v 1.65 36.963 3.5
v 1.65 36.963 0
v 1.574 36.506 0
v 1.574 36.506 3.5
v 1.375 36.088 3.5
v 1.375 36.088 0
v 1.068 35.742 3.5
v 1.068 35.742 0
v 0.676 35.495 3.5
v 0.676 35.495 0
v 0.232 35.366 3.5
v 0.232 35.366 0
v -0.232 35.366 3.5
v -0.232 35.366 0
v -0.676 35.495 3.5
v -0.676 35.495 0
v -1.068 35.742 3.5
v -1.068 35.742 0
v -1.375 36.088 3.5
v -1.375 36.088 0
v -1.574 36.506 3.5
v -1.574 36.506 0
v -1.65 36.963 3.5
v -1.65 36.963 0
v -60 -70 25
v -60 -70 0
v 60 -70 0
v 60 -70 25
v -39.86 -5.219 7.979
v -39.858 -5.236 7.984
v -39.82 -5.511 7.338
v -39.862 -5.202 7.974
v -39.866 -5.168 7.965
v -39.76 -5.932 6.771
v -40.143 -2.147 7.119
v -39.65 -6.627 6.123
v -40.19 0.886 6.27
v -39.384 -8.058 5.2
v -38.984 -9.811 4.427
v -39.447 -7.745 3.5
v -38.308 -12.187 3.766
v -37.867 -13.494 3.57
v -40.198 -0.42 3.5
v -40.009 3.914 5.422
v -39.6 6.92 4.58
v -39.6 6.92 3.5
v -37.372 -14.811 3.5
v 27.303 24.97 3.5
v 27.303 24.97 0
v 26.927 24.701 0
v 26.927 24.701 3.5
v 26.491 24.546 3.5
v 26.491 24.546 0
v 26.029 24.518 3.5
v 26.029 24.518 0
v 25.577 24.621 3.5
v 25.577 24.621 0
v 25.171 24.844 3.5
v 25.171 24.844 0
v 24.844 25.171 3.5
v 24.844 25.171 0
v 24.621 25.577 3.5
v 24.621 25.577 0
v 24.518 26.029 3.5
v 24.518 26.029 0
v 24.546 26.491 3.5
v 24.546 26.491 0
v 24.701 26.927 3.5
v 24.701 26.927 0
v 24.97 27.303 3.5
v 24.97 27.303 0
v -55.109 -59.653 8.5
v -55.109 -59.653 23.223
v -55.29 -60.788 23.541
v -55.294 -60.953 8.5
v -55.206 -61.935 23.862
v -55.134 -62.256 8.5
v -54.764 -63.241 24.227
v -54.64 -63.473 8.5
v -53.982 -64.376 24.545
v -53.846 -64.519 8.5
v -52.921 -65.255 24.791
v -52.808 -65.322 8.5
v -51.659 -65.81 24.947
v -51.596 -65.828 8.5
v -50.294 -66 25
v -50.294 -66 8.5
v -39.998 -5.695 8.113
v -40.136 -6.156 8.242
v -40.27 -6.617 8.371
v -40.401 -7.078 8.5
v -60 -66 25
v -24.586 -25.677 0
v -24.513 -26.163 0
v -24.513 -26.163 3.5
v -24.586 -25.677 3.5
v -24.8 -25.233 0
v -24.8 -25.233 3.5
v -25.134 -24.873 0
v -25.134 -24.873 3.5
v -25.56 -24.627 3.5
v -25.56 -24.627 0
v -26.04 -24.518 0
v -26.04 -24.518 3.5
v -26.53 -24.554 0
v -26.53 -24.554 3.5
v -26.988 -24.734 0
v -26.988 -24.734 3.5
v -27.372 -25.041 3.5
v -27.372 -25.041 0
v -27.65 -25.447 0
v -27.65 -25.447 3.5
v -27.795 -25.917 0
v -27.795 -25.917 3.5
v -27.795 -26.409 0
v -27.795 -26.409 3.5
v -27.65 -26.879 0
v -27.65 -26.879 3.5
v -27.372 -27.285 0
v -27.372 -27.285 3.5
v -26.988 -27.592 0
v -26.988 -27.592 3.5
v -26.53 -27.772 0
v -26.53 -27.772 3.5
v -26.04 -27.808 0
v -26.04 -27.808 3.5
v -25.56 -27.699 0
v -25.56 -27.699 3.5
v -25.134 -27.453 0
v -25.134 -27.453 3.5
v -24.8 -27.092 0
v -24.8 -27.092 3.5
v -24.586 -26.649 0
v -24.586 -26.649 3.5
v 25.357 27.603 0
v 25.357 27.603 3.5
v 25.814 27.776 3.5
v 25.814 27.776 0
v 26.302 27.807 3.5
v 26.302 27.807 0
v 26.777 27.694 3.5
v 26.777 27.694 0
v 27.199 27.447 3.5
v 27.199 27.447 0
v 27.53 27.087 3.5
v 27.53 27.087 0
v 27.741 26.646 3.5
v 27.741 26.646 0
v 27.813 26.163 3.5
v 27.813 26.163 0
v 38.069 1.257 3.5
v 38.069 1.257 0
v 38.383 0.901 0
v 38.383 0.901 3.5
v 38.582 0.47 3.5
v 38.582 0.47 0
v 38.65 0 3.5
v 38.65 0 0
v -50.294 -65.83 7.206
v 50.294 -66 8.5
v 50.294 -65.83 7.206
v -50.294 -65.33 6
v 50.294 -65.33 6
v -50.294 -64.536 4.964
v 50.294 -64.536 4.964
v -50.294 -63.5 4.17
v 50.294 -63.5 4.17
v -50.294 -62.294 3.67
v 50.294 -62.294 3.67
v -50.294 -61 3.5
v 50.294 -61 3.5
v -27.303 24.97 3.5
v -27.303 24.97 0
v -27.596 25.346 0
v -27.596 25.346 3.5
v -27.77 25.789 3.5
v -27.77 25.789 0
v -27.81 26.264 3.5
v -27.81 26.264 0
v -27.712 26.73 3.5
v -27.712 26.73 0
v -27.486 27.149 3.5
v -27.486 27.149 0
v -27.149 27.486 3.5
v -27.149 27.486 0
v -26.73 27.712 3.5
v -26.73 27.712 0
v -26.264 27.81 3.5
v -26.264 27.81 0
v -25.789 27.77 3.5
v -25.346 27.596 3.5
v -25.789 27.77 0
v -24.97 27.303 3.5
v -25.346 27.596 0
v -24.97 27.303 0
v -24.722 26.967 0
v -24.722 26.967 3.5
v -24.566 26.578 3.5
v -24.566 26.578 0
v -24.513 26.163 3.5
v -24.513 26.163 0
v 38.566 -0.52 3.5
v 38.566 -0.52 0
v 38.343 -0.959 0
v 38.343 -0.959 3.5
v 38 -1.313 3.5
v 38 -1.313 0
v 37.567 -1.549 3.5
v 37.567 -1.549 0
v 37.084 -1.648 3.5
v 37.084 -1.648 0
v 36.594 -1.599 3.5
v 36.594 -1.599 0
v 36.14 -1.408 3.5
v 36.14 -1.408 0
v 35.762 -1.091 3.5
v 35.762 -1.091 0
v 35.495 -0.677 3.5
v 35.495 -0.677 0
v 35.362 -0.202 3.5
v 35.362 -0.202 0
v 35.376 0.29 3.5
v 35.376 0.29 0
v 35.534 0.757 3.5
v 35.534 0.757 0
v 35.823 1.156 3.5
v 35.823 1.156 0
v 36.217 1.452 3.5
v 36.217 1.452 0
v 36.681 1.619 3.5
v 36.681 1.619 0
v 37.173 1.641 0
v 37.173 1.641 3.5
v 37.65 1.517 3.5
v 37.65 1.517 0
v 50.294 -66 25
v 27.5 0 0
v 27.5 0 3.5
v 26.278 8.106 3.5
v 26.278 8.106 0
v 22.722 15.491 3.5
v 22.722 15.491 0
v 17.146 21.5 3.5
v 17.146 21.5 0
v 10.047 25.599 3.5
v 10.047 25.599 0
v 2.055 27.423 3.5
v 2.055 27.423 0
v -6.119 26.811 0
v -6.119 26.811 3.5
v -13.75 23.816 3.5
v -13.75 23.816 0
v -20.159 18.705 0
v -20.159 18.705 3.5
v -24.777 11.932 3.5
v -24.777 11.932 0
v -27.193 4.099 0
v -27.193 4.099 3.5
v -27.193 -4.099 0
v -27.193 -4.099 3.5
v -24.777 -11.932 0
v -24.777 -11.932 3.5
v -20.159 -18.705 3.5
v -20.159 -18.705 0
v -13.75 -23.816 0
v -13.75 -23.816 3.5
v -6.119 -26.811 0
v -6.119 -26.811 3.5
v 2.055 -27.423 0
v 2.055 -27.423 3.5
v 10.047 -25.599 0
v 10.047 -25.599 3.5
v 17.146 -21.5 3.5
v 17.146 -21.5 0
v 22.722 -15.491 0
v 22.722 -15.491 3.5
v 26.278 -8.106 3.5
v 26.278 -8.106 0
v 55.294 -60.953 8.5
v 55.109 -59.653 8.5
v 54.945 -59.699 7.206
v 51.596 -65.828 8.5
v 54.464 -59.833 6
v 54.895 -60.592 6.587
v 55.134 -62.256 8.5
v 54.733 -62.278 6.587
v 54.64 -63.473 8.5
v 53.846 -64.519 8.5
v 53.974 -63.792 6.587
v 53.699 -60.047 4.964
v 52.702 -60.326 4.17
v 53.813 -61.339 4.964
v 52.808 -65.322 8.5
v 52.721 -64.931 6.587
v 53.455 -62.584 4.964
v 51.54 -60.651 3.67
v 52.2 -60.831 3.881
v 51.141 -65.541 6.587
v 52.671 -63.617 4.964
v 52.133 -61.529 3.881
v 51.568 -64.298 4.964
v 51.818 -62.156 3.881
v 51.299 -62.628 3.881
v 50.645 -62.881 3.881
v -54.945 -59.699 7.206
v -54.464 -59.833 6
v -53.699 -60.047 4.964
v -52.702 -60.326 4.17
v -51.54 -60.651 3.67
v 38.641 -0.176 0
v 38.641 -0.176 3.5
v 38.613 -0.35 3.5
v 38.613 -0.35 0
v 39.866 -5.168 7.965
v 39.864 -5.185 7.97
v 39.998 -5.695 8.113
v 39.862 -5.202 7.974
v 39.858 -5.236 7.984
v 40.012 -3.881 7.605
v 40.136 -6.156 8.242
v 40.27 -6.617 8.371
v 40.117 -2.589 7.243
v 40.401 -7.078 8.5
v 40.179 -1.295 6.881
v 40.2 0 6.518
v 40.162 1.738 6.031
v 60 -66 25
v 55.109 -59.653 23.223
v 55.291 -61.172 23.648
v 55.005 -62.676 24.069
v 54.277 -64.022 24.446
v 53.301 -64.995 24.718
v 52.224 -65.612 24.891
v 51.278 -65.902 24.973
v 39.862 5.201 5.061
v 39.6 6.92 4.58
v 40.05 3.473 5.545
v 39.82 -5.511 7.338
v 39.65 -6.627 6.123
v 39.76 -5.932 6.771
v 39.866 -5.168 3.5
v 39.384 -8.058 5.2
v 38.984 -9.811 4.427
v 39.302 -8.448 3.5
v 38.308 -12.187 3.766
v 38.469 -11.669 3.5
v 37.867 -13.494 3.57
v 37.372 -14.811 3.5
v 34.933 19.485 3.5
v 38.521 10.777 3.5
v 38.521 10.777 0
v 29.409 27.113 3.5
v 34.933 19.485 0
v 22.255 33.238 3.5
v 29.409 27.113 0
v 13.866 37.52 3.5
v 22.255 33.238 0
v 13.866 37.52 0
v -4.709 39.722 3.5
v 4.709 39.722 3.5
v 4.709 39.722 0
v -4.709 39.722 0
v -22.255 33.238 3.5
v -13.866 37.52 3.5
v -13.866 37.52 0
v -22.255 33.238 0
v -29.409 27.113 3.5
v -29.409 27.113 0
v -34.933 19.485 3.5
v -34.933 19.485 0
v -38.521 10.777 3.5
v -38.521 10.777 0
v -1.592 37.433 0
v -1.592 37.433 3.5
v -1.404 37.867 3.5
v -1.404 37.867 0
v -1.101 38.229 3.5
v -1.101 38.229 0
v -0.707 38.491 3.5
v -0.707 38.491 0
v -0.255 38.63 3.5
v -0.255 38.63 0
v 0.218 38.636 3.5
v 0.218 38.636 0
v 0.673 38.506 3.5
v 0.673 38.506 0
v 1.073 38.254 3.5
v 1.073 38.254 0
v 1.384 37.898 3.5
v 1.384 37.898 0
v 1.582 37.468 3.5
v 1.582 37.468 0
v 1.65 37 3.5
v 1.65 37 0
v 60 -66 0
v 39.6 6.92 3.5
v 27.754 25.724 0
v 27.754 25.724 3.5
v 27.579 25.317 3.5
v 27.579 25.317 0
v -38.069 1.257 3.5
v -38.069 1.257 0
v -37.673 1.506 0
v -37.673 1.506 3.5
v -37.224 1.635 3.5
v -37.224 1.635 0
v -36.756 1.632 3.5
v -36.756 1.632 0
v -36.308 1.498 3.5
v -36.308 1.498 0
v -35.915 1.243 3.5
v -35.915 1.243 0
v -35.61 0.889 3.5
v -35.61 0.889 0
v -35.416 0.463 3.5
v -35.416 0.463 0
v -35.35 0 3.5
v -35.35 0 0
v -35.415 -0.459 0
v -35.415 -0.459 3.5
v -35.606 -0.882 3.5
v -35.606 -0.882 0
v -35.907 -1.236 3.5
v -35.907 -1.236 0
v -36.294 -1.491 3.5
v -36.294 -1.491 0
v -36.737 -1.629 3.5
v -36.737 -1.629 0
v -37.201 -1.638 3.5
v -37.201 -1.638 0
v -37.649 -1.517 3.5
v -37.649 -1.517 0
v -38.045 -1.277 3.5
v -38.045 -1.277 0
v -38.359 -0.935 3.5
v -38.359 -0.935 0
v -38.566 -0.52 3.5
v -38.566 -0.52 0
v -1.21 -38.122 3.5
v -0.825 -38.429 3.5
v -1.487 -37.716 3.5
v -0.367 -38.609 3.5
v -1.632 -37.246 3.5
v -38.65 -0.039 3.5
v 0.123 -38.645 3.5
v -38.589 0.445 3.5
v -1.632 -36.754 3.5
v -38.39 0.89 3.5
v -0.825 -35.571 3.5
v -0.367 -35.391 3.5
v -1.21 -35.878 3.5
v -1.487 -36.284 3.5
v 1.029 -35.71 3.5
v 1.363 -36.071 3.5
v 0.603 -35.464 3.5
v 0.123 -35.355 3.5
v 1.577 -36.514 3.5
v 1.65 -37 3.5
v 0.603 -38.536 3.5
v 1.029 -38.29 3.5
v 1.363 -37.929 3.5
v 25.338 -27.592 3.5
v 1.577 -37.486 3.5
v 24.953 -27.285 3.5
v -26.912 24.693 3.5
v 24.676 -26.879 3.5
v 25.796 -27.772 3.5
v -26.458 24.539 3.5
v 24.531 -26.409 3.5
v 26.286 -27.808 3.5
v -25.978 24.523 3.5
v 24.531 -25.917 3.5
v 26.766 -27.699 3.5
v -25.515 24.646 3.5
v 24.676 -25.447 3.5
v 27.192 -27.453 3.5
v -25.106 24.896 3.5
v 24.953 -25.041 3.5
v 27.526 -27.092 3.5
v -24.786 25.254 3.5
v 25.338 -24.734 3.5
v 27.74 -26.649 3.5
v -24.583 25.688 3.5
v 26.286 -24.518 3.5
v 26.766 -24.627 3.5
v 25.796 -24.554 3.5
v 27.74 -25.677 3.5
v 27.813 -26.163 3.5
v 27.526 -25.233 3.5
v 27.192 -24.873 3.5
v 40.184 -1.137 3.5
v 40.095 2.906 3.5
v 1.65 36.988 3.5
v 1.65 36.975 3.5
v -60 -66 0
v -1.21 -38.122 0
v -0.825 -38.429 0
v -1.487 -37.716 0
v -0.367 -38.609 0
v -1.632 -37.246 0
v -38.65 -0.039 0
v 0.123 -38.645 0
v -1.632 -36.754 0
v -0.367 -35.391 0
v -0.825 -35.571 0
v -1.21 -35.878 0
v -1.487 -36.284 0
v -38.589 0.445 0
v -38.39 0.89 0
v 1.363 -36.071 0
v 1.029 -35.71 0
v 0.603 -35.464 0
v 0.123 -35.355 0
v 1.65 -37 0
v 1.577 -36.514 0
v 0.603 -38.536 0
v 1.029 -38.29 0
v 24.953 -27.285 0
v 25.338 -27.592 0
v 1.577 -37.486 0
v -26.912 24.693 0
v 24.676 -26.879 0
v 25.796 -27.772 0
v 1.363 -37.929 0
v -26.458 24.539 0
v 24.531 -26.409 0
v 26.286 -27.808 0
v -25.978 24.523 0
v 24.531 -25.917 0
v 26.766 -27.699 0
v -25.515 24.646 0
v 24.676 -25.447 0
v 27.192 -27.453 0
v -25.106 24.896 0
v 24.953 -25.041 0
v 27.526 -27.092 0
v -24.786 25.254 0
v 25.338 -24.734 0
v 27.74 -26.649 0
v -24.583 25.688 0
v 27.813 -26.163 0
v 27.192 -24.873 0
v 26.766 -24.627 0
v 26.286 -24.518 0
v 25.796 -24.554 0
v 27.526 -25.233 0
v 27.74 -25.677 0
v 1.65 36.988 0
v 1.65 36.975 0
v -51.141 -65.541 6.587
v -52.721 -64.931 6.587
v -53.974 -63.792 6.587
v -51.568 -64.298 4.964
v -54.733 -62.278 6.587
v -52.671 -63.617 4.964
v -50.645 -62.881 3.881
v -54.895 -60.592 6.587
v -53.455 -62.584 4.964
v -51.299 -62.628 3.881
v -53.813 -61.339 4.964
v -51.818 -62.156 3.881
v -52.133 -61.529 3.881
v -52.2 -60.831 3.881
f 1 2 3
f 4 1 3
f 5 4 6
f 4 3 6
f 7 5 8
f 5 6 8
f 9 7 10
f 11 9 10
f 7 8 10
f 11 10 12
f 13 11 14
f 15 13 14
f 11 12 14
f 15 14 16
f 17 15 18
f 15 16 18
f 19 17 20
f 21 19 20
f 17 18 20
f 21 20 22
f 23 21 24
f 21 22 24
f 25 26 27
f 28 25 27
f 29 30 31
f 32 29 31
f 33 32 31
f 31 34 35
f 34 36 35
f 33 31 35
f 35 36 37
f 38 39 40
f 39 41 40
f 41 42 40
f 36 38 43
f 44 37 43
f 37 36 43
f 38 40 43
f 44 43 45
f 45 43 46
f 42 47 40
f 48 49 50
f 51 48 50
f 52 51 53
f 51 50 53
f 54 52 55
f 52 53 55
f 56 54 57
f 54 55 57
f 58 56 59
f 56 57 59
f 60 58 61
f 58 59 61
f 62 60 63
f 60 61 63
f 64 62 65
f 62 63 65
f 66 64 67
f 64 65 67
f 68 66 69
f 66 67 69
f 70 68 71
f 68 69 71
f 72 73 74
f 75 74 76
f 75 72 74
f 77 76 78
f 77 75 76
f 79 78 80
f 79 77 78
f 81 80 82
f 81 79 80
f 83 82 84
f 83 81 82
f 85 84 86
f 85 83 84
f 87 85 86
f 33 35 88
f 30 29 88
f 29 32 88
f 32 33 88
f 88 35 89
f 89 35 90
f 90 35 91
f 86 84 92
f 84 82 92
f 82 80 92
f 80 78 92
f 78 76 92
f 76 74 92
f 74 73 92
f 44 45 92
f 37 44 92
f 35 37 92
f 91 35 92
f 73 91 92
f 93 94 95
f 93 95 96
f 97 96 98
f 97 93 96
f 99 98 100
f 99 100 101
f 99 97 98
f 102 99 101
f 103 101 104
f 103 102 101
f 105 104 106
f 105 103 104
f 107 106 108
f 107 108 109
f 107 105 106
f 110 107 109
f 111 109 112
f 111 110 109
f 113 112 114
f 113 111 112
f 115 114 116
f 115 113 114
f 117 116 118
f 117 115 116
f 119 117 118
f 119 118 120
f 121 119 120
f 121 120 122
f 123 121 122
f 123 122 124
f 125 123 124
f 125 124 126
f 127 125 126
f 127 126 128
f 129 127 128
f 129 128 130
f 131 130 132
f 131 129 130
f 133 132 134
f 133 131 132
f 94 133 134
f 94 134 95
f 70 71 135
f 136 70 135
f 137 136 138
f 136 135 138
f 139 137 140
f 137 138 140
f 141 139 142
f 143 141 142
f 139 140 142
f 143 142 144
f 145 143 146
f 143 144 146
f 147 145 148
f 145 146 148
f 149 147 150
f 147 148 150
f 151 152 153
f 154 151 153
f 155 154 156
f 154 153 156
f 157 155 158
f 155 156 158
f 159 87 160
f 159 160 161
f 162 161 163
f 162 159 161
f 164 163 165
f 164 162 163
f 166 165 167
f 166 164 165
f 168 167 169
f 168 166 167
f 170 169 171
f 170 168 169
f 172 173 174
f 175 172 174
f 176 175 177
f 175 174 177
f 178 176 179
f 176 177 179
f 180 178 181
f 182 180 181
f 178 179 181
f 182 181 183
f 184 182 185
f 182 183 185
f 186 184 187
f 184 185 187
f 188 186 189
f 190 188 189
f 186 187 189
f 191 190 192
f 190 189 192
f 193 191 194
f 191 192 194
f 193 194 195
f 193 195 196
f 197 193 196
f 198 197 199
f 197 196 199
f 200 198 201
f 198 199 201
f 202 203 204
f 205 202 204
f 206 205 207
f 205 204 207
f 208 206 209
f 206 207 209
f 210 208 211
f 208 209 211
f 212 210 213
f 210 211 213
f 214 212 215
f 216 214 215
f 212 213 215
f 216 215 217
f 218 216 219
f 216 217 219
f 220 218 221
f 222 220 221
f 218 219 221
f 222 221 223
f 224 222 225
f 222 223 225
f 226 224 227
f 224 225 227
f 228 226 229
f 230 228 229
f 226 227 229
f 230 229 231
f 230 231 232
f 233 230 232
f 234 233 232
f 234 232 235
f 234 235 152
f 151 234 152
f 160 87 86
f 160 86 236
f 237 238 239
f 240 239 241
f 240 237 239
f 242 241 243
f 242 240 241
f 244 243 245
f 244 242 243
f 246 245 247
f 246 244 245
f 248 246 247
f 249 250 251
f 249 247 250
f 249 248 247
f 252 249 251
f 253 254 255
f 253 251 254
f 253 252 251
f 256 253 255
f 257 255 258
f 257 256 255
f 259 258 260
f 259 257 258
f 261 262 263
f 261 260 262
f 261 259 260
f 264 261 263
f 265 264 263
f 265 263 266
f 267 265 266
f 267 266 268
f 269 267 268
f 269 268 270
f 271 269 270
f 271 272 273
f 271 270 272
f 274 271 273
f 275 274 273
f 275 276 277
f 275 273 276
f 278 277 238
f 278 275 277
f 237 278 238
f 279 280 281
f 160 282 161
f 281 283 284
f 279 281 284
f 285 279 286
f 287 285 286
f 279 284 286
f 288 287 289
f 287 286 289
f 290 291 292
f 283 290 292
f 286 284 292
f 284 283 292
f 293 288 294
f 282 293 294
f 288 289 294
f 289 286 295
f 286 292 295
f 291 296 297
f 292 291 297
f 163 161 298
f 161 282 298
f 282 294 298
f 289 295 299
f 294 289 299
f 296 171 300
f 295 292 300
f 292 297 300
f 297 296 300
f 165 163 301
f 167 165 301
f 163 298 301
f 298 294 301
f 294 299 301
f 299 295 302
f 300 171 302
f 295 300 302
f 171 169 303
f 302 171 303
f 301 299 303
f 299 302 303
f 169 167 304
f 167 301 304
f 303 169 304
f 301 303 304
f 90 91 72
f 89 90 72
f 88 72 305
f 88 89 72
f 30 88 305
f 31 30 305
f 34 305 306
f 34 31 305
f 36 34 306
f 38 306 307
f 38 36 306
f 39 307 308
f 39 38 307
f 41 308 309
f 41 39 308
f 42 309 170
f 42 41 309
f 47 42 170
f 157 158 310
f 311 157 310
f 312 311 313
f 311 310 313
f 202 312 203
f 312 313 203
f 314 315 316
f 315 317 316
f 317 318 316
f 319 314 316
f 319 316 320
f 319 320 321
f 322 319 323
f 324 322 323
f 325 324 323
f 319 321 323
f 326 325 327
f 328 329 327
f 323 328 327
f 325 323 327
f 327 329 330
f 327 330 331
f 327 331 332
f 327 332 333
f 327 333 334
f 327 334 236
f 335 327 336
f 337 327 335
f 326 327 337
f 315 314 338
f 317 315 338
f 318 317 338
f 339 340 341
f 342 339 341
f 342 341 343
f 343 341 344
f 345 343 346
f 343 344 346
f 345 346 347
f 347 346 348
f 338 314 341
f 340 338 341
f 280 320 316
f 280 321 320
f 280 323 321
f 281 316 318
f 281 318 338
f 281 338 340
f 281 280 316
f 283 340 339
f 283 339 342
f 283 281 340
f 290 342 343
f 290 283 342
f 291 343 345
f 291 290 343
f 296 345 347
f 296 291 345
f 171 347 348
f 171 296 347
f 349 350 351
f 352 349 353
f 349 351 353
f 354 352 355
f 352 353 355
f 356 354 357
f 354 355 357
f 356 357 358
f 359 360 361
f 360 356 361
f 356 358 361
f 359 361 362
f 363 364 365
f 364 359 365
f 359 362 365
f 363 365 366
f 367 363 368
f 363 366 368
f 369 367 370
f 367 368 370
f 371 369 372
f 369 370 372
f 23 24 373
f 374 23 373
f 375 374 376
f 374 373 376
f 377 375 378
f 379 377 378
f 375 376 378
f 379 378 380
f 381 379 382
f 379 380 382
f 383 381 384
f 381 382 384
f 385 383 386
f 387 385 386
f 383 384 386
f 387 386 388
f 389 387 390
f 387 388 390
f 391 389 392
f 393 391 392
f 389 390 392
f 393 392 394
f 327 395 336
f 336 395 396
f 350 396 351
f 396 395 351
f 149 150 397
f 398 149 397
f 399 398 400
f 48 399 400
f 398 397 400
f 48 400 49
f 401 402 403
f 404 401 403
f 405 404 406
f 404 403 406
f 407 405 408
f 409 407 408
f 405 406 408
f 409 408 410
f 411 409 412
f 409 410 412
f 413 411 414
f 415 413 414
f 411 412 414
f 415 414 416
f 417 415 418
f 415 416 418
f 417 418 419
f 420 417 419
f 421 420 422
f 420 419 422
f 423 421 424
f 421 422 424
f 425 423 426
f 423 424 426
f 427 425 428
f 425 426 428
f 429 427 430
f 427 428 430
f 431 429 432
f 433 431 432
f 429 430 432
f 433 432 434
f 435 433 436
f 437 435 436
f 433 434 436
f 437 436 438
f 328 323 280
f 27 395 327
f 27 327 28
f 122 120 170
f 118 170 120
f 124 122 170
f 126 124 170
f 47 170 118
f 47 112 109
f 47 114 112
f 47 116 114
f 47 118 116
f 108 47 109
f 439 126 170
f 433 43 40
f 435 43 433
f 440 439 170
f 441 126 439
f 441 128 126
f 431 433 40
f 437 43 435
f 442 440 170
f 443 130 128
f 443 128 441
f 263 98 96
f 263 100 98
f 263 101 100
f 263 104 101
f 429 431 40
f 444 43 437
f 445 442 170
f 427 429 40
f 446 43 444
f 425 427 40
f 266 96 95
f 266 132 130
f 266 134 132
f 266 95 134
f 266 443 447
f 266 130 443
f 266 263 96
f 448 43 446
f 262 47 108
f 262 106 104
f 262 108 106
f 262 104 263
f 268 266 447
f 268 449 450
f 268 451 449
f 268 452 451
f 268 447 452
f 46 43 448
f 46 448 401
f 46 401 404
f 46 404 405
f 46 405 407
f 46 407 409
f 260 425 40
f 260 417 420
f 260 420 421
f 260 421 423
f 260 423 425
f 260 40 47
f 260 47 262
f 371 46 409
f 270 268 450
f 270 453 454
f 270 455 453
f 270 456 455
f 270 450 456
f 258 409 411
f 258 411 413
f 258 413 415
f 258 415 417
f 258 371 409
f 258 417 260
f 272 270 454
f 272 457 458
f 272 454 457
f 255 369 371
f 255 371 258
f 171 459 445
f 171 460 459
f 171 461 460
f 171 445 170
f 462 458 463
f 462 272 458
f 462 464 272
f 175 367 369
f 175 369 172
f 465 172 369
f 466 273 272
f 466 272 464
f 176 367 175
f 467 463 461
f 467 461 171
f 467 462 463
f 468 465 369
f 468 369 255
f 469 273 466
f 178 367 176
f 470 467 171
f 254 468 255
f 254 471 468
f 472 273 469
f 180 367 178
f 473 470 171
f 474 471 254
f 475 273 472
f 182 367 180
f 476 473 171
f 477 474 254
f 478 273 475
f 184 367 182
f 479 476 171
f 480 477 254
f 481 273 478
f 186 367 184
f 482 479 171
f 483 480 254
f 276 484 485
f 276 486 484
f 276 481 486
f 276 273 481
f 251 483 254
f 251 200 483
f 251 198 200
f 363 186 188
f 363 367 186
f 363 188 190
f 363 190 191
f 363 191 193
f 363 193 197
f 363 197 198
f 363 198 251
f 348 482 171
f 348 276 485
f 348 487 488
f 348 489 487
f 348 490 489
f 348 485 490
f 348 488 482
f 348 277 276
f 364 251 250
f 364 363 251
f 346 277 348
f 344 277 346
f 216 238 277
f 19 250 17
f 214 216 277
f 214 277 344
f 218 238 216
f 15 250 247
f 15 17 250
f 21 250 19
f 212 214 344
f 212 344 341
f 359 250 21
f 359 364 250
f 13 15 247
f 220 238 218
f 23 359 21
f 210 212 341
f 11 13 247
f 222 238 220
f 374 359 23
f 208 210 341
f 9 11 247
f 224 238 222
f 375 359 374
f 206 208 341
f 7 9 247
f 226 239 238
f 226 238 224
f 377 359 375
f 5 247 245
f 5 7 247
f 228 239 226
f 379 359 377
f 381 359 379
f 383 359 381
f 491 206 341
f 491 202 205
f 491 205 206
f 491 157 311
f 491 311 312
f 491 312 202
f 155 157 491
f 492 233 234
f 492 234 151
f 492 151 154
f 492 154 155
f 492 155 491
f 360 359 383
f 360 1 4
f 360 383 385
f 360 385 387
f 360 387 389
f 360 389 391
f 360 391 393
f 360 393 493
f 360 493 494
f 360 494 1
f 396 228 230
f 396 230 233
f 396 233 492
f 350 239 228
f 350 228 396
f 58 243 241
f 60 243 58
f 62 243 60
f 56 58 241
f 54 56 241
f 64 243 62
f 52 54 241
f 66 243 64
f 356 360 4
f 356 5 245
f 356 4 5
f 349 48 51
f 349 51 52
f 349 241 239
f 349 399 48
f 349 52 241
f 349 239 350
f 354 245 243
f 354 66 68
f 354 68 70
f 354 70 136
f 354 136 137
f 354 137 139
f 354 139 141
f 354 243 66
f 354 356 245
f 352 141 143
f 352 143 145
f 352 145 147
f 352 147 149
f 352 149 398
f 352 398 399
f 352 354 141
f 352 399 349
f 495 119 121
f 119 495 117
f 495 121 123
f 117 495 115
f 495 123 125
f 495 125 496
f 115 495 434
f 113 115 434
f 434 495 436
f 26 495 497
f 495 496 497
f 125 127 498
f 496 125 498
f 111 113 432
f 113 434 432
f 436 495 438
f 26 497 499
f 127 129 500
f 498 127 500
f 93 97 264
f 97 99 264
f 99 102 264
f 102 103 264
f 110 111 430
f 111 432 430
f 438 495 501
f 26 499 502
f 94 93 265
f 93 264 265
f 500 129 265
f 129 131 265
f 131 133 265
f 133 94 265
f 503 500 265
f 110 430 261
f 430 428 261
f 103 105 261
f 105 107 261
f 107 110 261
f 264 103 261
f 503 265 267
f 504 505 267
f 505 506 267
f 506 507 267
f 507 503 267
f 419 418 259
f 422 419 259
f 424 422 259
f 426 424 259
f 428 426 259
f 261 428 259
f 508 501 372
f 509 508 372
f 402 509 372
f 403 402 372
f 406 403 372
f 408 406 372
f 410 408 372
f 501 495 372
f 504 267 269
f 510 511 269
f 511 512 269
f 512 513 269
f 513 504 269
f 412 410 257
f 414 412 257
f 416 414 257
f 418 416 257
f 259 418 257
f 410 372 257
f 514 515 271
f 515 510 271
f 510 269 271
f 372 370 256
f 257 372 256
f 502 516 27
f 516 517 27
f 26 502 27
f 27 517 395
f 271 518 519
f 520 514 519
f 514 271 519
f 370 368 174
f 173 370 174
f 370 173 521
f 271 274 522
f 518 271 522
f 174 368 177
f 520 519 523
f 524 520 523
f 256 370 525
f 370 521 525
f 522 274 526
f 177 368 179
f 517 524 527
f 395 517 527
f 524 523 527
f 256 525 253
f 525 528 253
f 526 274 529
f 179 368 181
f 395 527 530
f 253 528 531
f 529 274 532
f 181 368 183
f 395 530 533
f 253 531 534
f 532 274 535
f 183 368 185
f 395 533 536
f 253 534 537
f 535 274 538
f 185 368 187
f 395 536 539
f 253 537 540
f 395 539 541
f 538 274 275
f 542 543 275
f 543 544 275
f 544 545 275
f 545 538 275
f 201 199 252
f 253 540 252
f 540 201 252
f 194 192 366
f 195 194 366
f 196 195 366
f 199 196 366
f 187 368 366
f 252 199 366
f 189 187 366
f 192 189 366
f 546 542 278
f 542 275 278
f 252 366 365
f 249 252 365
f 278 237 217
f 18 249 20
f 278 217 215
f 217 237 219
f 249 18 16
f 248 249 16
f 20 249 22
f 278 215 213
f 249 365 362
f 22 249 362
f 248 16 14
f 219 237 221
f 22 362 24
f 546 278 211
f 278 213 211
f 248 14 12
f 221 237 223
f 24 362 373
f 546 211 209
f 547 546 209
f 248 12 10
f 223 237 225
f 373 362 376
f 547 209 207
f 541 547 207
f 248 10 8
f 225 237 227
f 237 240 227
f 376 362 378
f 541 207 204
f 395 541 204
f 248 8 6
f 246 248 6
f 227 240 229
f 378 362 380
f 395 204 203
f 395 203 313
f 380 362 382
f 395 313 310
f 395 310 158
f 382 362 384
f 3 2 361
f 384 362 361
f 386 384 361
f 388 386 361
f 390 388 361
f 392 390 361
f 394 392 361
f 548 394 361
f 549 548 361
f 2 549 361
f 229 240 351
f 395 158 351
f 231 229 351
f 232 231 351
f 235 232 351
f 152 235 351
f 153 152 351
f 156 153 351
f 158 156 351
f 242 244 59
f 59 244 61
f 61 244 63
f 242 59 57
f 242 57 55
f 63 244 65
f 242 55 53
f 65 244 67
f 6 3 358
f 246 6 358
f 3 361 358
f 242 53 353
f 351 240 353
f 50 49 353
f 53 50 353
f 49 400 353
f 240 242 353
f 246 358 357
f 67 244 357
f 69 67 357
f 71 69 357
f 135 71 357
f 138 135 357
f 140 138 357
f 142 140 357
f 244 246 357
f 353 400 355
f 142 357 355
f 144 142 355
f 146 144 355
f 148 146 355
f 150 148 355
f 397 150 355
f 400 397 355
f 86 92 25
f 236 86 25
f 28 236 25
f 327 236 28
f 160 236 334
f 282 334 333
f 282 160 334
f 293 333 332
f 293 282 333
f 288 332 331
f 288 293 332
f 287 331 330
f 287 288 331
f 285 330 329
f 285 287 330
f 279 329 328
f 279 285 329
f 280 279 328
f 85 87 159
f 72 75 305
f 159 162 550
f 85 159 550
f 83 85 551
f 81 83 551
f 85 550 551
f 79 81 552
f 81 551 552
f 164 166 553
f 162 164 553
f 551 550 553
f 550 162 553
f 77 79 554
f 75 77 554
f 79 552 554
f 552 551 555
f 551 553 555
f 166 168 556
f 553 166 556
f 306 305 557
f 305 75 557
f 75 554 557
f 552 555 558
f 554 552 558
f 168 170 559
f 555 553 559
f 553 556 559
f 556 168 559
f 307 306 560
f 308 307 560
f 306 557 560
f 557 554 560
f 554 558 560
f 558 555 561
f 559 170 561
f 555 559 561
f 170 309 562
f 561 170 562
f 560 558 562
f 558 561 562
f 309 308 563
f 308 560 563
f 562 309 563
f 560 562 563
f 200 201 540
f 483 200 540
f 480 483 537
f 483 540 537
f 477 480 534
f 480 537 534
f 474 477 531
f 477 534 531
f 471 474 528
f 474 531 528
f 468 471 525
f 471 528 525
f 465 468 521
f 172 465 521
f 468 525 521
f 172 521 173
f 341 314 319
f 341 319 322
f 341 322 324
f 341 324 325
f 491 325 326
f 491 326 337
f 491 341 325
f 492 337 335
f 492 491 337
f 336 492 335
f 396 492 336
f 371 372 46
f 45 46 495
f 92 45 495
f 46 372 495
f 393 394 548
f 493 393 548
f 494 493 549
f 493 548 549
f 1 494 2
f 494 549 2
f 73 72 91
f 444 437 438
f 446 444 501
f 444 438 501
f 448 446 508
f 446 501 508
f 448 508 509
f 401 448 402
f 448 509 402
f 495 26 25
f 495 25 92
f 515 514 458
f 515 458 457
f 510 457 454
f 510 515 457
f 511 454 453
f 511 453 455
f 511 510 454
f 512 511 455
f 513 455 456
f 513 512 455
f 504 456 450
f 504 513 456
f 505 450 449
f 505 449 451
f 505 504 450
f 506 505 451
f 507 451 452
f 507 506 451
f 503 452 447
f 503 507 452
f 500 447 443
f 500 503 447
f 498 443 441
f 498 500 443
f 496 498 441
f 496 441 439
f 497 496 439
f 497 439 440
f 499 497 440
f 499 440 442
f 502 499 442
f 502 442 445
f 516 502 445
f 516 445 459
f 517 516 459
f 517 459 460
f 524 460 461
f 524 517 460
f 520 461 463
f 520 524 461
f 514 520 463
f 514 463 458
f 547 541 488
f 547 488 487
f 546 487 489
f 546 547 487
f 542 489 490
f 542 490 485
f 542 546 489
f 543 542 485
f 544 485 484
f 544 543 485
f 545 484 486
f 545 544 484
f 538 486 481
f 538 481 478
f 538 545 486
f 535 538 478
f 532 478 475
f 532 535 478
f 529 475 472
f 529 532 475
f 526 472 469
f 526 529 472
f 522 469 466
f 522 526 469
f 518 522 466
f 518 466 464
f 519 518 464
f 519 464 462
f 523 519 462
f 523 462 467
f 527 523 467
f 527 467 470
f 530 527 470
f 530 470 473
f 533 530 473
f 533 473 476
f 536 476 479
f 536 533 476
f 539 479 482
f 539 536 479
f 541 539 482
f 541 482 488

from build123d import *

# Parameters (mm, degrees)
EXTRUDE_3_DEPTH          = 25
SKETCH_1_5_R             = 1.65
SKETCH_1_5_R_2           = 27.5
EXTRUDE_4_DEPTH          = 3.5
CUT_EXTRUDE_1_DEPTH      = 116
CUT_EXTRUDE_1_DEPTH_BACK = 90
SKETCH_3_R               = 40.2
CUT_EXTRUDE_2_DEPTH      = 90
FILLET_1_R               = 5


with BuildPart() as part:
    # 草图1 → 凸台-拉伸3 (new body)
    with BuildSketch(Plane.XY):
        with BuildLine():
            Line((56.884812739, -66), (60, -66))
            Line((60, -66), (38.520958758, 10.776629174))
            ThreePointArc((38.520958758, 10.776629174), (0, 40), (-38.520958758, 10.776629174))
            Line((-38.520958758, 10.776629174), (-60, -66))
            Line((-60, -66), (-56.884812739, -66))
            Line((-56.884812739, -66), (-38.56602674, -0.519673214))
            ThreePointArc((-38.56602674, -0.519673214), (-38.588989549, 0.444535953), (-38.069024769, 1.256855618))
            Line((-38.069024769, 1.256855618), (-35.631886851, 9.968381986))
            ThreePointArc((-35.631886851, 9.968381986), (-32.349305917, 17.958908839), (-27.303372186, 24.970499941))
            ThreePointArc((-27.303372186, 24.970499941), (-27.329677093, 27.329677093), (-24.970499941, 27.303372186))
            ThreePointArc((-24.970499941, 27.303372186), (-14.159286998, 34.183542703), (-1.649589784, 36.963209459))
            ThreePointArc((-1.649589784, 36.963209459), (-0.018396414, 38.649897443), (1.65, 37))
            ThreePointArc((1.65, 37), (1.649897443, 36.981603586), (1.649589784, 36.963209459))
            ThreePointArc((1.649589784, 36.963209459), (14.159286998, 34.183542703), (24.970499941, 27.303372186))
            ThreePointArc((24.970499941, 27.303372186), (26.77734325, 27.694297385), (27.812950904, 26.162950904))
            ThreePointArc((27.812950904, 26.162950904), (27.680217379, 25.514566417), (27.303372186, 24.970499941))
            ThreePointArc((27.303372186, 24.970499941), (32.349305917, 17.958908839), (35.631886851, 9.968381986))
            Line((35.631886851, 9.968381986), (38.069024769, 1.256855618))
            ThreePointArc((38.069024769, 1.256855618), (38.497730094, 0.692318255), (38.65, 0))
            ThreePointArc((38.65, 0), (38.628871407, -0.263207028), (38.56602674, -0.519673214))
            Line((38.56602674, -0.519673214), (56.884812739, -66))
        make_face()
        Polygon((-60, -70), (-60, -66), (60, -66), (60, -70), (0, -70), align=None)
    extrude(amount=EXTRUDE_3_DEPTH)

    # 草图1<5> → 凸台-拉伸4 (add)
    with BuildSketch(Plane.XY):
        with BuildLine():
            Line((-56.884812739, -66), (56.884812739, -66))
            Line((56.884812739, -66), (38.56602674, -0.519673214))
            ThreePointArc((38.56602674, -0.519673214), (35.411010451, -0.444535953), (38.069024769, 1.256855618))
            Line((38.069024769, 1.256855618), (35.631886851, 9.968381986))
            ThreePointArc((35.631886851, 9.968381986), (32.349305917, 17.958908839), (27.303372186, 24.970499941))
            ThreePointArc((27.303372186, 24.970499941), (24.996224715, 24.996224715), (24.970499941, 27.303372186))
            ThreePointArc((24.970499941, 27.303372186), (14.159286998, 34.183542703), (1.649589784, 36.963209459))
            ThreePointArc((1.649589784, 36.963209459), (0, 35.35), (-1.649589784, 36.963209459))
            ThreePointArc((-1.649589784, 36.963209459), (-14.159286998, 34.183542703), (-24.970499941, 27.303372186))
            ThreePointArc((-24.970499941, 27.303372186), (-24.631604423, 26.77734325), (-24.512950904, 26.162950904))
            ThreePointArc((-24.512950904, 26.162950904), (-25.514566417, 24.645684428), (-27.303372186, 24.970499941))
            ThreePointArc((-27.303372186, 24.970499941), (-32.349305917, 17.958908839), (-35.631886851, 9.968381986))
            Line((-35.631886851, 9.968381986), (-38.069024769, 1.256855618))
            ThreePointArc((-38.069024769, 1.256855618), (-36.307681745, 1.497730094), (-35.35, 0))
            ThreePointArc((-35.35, 0), (-36.736792972, -1.628871407), (-38.56602674, -0.519673214))
            Line((-38.56602674, -0.519673214), (-56.884812739, -66))
        make_face()
        with Locations((0, -37)):
            Circle(SKETCH_1_5_R, mode=Mode.SUBTRACT)
        with Locations((-26.162950904, -26.162950904)):
            Circle(SKETCH_1_5_R, mode=Mode.SUBTRACT)
        with Locations((26.162950904, -26.162950904)):
            Circle(SKETCH_1_5_R, mode=Mode.SUBTRACT)
        Circle(SKETCH_1_5_R_2, mode=Mode.SUBTRACT)
    extrude(amount=EXTRUDE_4_DEPTH)

    # 草图2 → 切除-拉伸1 (cut, two sides: drawn at the far end of the back side and taken through both)
    with BuildSketch(Plane(origin=(0, 0, 0), x_dir=(0, 0, -1), z_dir=(1, 0, 0)).offset(-CUT_EXTRUDE_1_DEPTH_BACK)):
        Polygon((-25, -66), (-3.5, 10.776629174), (-3.5, 62.872025622), (-39.293867153, 54.574713181), (-52.271714816, -41.589010491), align=None)
    extrude(amount=CUT_EXTRUDE_1_DEPTH + CUT_EXTRUDE_1_DEPTH_BACK, mode=Mode.SUBTRACT)

    # 草图3 → 切除-拉伸2 (cut)
    with BuildSketch(Plane.XY.offset(3.5)):
        Circle(SKETCH_3_R)
    extrude(amount=CUT_EXTRUDE_2_DEPTH, mode=Mode.SUBTRACT)

    # 圆角1
    # the kernel refuses this fillet: 5 mm, written as the material it adds along each edge
    with BuildSketch(Plane(origin=(-50.294033224, -61, 8.5), x_dir=(0, -1, 0), z_dir=(0, 0, -1))) as fillet_1_piece_1_section:
        Polygon((0, 0), (FILLET_1_R, 0), (FILLET_1_R, FILLET_1_R * 1.31815590294), (-FILLET_1_R * 0.269415729351, FILLET_1_R * 0.963023968953), align=None)
    fillet_1_piece_1 = extrude(amount=FILLET_1_R, mode=Mode.PRIVATE)
    fillet_1_piece_1 = fillet_1_piece_1 - Plane(origin=(-50.294033224, -61, 8.5), x_dir=(0.7966855494331734, 0.6043940232367977, 0), z_dir=(0, 0, -1)) * Sphere(FILLET_1_R, mode=Mode.PRIVATE)
    add(fillet_1_piece_1)
    with BuildSketch(Plane(origin=(50.294033224, -61, 8.5), x_dir=(0.9630239689530686, 0.26941572935127434, 0), z_dir=(0, 0, -1))) as fillet_1_piece_2_section:
        Polygon((0, 0), (FILLET_1_R, 0), (FILLET_1_R, FILLET_1_R * 1.31815590294), (-FILLET_1_R * 0.269415729351, FILLET_1_R * 0.963023968953), align=None)
    fillet_1_piece_2 = extrude(amount=FILLET_1_R, mode=Mode.PRIVATE)
    fillet_1_piece_2 = fillet_1_piece_2 - Plane(origin=(50.294033224, -61, 8.5), x_dir=(-0.7966855494331732, 0.6043940232367977, 0), z_dir=(0, 0, -1)) * Sphere(FILLET_1_R, mode=Mode.PRIVATE)
    add(fillet_1_piece_2)
    with BuildSketch(Plane(origin=(-56.884812739, -66, 8.5), x_dir=(1, 0, 0), z_dir=(0, 0, 1))) as fillet_1_piece_3_section:
        with BuildLine():
            CenterArc((FILLET_1_R * 1.31815590294, FILLET_1_R), FILLET_1_R, 164.370497689, 105.629502311)
            Line((FILLET_1_R * 0.35513193399, FILLET_1_R * 1.26941572935), (0, 0))
            Line((0, 0), (FILLET_1_R * 1.31815590294, 0))
        make_face()
    fillet_1_piece_3 = extrude(amount=16.5, mode=Mode.PRIVATE)
    fillet_1_piece_3 = split(fillet_1_piece_3, bisect_by=Plane(origin=(-54.909873659, -62.45182584, 24.006393674), z_dir=(0, -0.26965951135538185, -0.9629557351901368)), keep=Keep.TOP, mode=Mode.PRIVATE)
    add(fillet_1_piece_3)
    with BuildSketch(Plane(origin=(56.884812739, -66, 8.5), x_dir=(-0.26941572935127367, 0.963023968953069, 0), z_dir=(0, 0, 1))) as fillet_1_piece_4_section:
        with BuildLine():
            CenterArc((FILLET_1_R * 1.31815590294, FILLET_1_R), FILLET_1_R, 164.370497689, 105.629502311)
            Line((FILLET_1_R * 0.35513193399, FILLET_1_R * 1.26941572935), (0, 0))
            Line((0, 0), (FILLET_1_R * 1.31815590294, 0))
        make_face()
    fillet_1_piece_4 = extrude(amount=16.5, mode=Mode.PRIVATE)
    fillet_1_piece_4 = split(fillet_1_piece_4, bisect_by=Plane(origin=(54.909873659, -62.45182584, 24.006393674), z_dir=(0, -0.26965951135538185, -0.9629557351901368)), keep=Keep.TOP, mode=Mode.PRIVATE)
    add(fillet_1_piece_4)
    with BuildSketch(Plane(origin=(-50.294033224, -66, 3.5), x_dir=(0, 1, 0), z_dir=(1, 0, 0))) as fillet_1_piece_5:
        with BuildLine():
            CenterArc((FILLET_1_R, FILLET_1_R), FILLET_1_R, 180, 90)
            Line((0, FILLET_1_R), (0, 0))
            Line((0, 0), (FILLET_1_R, 0))
        make_face()
    extrude(amount=100.588066449)
    with BuildSketch(Plane(origin=(-36.498733621, 6.86984643, 3.5), x_dir=(0.9630239689530686, -0.26941572935127456, 0), z_dir=(-0.26941572935127456, -0.9630239689530686, 0))) as fillet_1_piece_6_section:
        with BuildLine():
            CenterArc((FILLET_1_R, FILLET_1_R), FILLET_1_R, 180, 90)
            Line((0, FILLET_1_R), (0, 0))
            Line((0, 0), (FILLET_1_R, 0))
        make_face()
    fillet_1_piece_6 = extrude(amount=69.076959586, mode=Mode.PRIVATE)
    fillet_1_piece_6 = fillet_1_piece_6 - Plane(origin=(0, 0, 4.655624457), x_dir=(1, 0, 0), z_dir=(0, 0, -1)) * Cylinder(40.2, 159, mode=Mode.PRIVATE)
    fillet_1_piece_6 = split(fillet_1_piece_6, bisect_by=Plane(origin=(-46.735846126, -30.837467909, 15.153325978), z_dir=(0, -0.26965951135538185, -0.9629557351901368)), keep=Keep.TOP, mode=Mode.PRIVATE)
    add(fillet_1_piece_6)
    with BuildSketch(Plane(origin=(55.109153069, -59.652921353, 3.5), x_dir=(-0.9630239689530686, -0.2694157293512744, 0), z_dir=(-0.26941572935127434, 0.9630239689530686, 0))) as fillet_1_piece_7_section:
        with BuildLine():
            CenterArc((FILLET_1_R, FILLET_1_R), FILLET_1_R, 180, 90)
            Line((0, FILLET_1_R), (0, 0))
            Line((0, 0), (FILLET_1_R, 0))
        make_face()
    fillet_1_piece_7 = extrude(amount=69.076959586, mode=Mode.PRIVATE)
    fillet_1_piece_7 = fillet_1_piece_7 - Plane(origin=(0, 0, 4.655620612), x_dir=(1, 0, 0), z_dir=(0, 0, -1)) * Cylinder(40.2, 159, mode=Mode.PRIVATE)
    fillet_1_piece_7 = split(fillet_1_piece_7, bisect_by=Plane(origin=(46.735848084, -30.837472193, 15.153327178), z_dir=(0, -0.26965951135538185, -0.9629557351901368)), keep=Keep.TOP, mode=Mode.PRIVATE)
    add(fillet_1_piece_7)


solid = part.part
